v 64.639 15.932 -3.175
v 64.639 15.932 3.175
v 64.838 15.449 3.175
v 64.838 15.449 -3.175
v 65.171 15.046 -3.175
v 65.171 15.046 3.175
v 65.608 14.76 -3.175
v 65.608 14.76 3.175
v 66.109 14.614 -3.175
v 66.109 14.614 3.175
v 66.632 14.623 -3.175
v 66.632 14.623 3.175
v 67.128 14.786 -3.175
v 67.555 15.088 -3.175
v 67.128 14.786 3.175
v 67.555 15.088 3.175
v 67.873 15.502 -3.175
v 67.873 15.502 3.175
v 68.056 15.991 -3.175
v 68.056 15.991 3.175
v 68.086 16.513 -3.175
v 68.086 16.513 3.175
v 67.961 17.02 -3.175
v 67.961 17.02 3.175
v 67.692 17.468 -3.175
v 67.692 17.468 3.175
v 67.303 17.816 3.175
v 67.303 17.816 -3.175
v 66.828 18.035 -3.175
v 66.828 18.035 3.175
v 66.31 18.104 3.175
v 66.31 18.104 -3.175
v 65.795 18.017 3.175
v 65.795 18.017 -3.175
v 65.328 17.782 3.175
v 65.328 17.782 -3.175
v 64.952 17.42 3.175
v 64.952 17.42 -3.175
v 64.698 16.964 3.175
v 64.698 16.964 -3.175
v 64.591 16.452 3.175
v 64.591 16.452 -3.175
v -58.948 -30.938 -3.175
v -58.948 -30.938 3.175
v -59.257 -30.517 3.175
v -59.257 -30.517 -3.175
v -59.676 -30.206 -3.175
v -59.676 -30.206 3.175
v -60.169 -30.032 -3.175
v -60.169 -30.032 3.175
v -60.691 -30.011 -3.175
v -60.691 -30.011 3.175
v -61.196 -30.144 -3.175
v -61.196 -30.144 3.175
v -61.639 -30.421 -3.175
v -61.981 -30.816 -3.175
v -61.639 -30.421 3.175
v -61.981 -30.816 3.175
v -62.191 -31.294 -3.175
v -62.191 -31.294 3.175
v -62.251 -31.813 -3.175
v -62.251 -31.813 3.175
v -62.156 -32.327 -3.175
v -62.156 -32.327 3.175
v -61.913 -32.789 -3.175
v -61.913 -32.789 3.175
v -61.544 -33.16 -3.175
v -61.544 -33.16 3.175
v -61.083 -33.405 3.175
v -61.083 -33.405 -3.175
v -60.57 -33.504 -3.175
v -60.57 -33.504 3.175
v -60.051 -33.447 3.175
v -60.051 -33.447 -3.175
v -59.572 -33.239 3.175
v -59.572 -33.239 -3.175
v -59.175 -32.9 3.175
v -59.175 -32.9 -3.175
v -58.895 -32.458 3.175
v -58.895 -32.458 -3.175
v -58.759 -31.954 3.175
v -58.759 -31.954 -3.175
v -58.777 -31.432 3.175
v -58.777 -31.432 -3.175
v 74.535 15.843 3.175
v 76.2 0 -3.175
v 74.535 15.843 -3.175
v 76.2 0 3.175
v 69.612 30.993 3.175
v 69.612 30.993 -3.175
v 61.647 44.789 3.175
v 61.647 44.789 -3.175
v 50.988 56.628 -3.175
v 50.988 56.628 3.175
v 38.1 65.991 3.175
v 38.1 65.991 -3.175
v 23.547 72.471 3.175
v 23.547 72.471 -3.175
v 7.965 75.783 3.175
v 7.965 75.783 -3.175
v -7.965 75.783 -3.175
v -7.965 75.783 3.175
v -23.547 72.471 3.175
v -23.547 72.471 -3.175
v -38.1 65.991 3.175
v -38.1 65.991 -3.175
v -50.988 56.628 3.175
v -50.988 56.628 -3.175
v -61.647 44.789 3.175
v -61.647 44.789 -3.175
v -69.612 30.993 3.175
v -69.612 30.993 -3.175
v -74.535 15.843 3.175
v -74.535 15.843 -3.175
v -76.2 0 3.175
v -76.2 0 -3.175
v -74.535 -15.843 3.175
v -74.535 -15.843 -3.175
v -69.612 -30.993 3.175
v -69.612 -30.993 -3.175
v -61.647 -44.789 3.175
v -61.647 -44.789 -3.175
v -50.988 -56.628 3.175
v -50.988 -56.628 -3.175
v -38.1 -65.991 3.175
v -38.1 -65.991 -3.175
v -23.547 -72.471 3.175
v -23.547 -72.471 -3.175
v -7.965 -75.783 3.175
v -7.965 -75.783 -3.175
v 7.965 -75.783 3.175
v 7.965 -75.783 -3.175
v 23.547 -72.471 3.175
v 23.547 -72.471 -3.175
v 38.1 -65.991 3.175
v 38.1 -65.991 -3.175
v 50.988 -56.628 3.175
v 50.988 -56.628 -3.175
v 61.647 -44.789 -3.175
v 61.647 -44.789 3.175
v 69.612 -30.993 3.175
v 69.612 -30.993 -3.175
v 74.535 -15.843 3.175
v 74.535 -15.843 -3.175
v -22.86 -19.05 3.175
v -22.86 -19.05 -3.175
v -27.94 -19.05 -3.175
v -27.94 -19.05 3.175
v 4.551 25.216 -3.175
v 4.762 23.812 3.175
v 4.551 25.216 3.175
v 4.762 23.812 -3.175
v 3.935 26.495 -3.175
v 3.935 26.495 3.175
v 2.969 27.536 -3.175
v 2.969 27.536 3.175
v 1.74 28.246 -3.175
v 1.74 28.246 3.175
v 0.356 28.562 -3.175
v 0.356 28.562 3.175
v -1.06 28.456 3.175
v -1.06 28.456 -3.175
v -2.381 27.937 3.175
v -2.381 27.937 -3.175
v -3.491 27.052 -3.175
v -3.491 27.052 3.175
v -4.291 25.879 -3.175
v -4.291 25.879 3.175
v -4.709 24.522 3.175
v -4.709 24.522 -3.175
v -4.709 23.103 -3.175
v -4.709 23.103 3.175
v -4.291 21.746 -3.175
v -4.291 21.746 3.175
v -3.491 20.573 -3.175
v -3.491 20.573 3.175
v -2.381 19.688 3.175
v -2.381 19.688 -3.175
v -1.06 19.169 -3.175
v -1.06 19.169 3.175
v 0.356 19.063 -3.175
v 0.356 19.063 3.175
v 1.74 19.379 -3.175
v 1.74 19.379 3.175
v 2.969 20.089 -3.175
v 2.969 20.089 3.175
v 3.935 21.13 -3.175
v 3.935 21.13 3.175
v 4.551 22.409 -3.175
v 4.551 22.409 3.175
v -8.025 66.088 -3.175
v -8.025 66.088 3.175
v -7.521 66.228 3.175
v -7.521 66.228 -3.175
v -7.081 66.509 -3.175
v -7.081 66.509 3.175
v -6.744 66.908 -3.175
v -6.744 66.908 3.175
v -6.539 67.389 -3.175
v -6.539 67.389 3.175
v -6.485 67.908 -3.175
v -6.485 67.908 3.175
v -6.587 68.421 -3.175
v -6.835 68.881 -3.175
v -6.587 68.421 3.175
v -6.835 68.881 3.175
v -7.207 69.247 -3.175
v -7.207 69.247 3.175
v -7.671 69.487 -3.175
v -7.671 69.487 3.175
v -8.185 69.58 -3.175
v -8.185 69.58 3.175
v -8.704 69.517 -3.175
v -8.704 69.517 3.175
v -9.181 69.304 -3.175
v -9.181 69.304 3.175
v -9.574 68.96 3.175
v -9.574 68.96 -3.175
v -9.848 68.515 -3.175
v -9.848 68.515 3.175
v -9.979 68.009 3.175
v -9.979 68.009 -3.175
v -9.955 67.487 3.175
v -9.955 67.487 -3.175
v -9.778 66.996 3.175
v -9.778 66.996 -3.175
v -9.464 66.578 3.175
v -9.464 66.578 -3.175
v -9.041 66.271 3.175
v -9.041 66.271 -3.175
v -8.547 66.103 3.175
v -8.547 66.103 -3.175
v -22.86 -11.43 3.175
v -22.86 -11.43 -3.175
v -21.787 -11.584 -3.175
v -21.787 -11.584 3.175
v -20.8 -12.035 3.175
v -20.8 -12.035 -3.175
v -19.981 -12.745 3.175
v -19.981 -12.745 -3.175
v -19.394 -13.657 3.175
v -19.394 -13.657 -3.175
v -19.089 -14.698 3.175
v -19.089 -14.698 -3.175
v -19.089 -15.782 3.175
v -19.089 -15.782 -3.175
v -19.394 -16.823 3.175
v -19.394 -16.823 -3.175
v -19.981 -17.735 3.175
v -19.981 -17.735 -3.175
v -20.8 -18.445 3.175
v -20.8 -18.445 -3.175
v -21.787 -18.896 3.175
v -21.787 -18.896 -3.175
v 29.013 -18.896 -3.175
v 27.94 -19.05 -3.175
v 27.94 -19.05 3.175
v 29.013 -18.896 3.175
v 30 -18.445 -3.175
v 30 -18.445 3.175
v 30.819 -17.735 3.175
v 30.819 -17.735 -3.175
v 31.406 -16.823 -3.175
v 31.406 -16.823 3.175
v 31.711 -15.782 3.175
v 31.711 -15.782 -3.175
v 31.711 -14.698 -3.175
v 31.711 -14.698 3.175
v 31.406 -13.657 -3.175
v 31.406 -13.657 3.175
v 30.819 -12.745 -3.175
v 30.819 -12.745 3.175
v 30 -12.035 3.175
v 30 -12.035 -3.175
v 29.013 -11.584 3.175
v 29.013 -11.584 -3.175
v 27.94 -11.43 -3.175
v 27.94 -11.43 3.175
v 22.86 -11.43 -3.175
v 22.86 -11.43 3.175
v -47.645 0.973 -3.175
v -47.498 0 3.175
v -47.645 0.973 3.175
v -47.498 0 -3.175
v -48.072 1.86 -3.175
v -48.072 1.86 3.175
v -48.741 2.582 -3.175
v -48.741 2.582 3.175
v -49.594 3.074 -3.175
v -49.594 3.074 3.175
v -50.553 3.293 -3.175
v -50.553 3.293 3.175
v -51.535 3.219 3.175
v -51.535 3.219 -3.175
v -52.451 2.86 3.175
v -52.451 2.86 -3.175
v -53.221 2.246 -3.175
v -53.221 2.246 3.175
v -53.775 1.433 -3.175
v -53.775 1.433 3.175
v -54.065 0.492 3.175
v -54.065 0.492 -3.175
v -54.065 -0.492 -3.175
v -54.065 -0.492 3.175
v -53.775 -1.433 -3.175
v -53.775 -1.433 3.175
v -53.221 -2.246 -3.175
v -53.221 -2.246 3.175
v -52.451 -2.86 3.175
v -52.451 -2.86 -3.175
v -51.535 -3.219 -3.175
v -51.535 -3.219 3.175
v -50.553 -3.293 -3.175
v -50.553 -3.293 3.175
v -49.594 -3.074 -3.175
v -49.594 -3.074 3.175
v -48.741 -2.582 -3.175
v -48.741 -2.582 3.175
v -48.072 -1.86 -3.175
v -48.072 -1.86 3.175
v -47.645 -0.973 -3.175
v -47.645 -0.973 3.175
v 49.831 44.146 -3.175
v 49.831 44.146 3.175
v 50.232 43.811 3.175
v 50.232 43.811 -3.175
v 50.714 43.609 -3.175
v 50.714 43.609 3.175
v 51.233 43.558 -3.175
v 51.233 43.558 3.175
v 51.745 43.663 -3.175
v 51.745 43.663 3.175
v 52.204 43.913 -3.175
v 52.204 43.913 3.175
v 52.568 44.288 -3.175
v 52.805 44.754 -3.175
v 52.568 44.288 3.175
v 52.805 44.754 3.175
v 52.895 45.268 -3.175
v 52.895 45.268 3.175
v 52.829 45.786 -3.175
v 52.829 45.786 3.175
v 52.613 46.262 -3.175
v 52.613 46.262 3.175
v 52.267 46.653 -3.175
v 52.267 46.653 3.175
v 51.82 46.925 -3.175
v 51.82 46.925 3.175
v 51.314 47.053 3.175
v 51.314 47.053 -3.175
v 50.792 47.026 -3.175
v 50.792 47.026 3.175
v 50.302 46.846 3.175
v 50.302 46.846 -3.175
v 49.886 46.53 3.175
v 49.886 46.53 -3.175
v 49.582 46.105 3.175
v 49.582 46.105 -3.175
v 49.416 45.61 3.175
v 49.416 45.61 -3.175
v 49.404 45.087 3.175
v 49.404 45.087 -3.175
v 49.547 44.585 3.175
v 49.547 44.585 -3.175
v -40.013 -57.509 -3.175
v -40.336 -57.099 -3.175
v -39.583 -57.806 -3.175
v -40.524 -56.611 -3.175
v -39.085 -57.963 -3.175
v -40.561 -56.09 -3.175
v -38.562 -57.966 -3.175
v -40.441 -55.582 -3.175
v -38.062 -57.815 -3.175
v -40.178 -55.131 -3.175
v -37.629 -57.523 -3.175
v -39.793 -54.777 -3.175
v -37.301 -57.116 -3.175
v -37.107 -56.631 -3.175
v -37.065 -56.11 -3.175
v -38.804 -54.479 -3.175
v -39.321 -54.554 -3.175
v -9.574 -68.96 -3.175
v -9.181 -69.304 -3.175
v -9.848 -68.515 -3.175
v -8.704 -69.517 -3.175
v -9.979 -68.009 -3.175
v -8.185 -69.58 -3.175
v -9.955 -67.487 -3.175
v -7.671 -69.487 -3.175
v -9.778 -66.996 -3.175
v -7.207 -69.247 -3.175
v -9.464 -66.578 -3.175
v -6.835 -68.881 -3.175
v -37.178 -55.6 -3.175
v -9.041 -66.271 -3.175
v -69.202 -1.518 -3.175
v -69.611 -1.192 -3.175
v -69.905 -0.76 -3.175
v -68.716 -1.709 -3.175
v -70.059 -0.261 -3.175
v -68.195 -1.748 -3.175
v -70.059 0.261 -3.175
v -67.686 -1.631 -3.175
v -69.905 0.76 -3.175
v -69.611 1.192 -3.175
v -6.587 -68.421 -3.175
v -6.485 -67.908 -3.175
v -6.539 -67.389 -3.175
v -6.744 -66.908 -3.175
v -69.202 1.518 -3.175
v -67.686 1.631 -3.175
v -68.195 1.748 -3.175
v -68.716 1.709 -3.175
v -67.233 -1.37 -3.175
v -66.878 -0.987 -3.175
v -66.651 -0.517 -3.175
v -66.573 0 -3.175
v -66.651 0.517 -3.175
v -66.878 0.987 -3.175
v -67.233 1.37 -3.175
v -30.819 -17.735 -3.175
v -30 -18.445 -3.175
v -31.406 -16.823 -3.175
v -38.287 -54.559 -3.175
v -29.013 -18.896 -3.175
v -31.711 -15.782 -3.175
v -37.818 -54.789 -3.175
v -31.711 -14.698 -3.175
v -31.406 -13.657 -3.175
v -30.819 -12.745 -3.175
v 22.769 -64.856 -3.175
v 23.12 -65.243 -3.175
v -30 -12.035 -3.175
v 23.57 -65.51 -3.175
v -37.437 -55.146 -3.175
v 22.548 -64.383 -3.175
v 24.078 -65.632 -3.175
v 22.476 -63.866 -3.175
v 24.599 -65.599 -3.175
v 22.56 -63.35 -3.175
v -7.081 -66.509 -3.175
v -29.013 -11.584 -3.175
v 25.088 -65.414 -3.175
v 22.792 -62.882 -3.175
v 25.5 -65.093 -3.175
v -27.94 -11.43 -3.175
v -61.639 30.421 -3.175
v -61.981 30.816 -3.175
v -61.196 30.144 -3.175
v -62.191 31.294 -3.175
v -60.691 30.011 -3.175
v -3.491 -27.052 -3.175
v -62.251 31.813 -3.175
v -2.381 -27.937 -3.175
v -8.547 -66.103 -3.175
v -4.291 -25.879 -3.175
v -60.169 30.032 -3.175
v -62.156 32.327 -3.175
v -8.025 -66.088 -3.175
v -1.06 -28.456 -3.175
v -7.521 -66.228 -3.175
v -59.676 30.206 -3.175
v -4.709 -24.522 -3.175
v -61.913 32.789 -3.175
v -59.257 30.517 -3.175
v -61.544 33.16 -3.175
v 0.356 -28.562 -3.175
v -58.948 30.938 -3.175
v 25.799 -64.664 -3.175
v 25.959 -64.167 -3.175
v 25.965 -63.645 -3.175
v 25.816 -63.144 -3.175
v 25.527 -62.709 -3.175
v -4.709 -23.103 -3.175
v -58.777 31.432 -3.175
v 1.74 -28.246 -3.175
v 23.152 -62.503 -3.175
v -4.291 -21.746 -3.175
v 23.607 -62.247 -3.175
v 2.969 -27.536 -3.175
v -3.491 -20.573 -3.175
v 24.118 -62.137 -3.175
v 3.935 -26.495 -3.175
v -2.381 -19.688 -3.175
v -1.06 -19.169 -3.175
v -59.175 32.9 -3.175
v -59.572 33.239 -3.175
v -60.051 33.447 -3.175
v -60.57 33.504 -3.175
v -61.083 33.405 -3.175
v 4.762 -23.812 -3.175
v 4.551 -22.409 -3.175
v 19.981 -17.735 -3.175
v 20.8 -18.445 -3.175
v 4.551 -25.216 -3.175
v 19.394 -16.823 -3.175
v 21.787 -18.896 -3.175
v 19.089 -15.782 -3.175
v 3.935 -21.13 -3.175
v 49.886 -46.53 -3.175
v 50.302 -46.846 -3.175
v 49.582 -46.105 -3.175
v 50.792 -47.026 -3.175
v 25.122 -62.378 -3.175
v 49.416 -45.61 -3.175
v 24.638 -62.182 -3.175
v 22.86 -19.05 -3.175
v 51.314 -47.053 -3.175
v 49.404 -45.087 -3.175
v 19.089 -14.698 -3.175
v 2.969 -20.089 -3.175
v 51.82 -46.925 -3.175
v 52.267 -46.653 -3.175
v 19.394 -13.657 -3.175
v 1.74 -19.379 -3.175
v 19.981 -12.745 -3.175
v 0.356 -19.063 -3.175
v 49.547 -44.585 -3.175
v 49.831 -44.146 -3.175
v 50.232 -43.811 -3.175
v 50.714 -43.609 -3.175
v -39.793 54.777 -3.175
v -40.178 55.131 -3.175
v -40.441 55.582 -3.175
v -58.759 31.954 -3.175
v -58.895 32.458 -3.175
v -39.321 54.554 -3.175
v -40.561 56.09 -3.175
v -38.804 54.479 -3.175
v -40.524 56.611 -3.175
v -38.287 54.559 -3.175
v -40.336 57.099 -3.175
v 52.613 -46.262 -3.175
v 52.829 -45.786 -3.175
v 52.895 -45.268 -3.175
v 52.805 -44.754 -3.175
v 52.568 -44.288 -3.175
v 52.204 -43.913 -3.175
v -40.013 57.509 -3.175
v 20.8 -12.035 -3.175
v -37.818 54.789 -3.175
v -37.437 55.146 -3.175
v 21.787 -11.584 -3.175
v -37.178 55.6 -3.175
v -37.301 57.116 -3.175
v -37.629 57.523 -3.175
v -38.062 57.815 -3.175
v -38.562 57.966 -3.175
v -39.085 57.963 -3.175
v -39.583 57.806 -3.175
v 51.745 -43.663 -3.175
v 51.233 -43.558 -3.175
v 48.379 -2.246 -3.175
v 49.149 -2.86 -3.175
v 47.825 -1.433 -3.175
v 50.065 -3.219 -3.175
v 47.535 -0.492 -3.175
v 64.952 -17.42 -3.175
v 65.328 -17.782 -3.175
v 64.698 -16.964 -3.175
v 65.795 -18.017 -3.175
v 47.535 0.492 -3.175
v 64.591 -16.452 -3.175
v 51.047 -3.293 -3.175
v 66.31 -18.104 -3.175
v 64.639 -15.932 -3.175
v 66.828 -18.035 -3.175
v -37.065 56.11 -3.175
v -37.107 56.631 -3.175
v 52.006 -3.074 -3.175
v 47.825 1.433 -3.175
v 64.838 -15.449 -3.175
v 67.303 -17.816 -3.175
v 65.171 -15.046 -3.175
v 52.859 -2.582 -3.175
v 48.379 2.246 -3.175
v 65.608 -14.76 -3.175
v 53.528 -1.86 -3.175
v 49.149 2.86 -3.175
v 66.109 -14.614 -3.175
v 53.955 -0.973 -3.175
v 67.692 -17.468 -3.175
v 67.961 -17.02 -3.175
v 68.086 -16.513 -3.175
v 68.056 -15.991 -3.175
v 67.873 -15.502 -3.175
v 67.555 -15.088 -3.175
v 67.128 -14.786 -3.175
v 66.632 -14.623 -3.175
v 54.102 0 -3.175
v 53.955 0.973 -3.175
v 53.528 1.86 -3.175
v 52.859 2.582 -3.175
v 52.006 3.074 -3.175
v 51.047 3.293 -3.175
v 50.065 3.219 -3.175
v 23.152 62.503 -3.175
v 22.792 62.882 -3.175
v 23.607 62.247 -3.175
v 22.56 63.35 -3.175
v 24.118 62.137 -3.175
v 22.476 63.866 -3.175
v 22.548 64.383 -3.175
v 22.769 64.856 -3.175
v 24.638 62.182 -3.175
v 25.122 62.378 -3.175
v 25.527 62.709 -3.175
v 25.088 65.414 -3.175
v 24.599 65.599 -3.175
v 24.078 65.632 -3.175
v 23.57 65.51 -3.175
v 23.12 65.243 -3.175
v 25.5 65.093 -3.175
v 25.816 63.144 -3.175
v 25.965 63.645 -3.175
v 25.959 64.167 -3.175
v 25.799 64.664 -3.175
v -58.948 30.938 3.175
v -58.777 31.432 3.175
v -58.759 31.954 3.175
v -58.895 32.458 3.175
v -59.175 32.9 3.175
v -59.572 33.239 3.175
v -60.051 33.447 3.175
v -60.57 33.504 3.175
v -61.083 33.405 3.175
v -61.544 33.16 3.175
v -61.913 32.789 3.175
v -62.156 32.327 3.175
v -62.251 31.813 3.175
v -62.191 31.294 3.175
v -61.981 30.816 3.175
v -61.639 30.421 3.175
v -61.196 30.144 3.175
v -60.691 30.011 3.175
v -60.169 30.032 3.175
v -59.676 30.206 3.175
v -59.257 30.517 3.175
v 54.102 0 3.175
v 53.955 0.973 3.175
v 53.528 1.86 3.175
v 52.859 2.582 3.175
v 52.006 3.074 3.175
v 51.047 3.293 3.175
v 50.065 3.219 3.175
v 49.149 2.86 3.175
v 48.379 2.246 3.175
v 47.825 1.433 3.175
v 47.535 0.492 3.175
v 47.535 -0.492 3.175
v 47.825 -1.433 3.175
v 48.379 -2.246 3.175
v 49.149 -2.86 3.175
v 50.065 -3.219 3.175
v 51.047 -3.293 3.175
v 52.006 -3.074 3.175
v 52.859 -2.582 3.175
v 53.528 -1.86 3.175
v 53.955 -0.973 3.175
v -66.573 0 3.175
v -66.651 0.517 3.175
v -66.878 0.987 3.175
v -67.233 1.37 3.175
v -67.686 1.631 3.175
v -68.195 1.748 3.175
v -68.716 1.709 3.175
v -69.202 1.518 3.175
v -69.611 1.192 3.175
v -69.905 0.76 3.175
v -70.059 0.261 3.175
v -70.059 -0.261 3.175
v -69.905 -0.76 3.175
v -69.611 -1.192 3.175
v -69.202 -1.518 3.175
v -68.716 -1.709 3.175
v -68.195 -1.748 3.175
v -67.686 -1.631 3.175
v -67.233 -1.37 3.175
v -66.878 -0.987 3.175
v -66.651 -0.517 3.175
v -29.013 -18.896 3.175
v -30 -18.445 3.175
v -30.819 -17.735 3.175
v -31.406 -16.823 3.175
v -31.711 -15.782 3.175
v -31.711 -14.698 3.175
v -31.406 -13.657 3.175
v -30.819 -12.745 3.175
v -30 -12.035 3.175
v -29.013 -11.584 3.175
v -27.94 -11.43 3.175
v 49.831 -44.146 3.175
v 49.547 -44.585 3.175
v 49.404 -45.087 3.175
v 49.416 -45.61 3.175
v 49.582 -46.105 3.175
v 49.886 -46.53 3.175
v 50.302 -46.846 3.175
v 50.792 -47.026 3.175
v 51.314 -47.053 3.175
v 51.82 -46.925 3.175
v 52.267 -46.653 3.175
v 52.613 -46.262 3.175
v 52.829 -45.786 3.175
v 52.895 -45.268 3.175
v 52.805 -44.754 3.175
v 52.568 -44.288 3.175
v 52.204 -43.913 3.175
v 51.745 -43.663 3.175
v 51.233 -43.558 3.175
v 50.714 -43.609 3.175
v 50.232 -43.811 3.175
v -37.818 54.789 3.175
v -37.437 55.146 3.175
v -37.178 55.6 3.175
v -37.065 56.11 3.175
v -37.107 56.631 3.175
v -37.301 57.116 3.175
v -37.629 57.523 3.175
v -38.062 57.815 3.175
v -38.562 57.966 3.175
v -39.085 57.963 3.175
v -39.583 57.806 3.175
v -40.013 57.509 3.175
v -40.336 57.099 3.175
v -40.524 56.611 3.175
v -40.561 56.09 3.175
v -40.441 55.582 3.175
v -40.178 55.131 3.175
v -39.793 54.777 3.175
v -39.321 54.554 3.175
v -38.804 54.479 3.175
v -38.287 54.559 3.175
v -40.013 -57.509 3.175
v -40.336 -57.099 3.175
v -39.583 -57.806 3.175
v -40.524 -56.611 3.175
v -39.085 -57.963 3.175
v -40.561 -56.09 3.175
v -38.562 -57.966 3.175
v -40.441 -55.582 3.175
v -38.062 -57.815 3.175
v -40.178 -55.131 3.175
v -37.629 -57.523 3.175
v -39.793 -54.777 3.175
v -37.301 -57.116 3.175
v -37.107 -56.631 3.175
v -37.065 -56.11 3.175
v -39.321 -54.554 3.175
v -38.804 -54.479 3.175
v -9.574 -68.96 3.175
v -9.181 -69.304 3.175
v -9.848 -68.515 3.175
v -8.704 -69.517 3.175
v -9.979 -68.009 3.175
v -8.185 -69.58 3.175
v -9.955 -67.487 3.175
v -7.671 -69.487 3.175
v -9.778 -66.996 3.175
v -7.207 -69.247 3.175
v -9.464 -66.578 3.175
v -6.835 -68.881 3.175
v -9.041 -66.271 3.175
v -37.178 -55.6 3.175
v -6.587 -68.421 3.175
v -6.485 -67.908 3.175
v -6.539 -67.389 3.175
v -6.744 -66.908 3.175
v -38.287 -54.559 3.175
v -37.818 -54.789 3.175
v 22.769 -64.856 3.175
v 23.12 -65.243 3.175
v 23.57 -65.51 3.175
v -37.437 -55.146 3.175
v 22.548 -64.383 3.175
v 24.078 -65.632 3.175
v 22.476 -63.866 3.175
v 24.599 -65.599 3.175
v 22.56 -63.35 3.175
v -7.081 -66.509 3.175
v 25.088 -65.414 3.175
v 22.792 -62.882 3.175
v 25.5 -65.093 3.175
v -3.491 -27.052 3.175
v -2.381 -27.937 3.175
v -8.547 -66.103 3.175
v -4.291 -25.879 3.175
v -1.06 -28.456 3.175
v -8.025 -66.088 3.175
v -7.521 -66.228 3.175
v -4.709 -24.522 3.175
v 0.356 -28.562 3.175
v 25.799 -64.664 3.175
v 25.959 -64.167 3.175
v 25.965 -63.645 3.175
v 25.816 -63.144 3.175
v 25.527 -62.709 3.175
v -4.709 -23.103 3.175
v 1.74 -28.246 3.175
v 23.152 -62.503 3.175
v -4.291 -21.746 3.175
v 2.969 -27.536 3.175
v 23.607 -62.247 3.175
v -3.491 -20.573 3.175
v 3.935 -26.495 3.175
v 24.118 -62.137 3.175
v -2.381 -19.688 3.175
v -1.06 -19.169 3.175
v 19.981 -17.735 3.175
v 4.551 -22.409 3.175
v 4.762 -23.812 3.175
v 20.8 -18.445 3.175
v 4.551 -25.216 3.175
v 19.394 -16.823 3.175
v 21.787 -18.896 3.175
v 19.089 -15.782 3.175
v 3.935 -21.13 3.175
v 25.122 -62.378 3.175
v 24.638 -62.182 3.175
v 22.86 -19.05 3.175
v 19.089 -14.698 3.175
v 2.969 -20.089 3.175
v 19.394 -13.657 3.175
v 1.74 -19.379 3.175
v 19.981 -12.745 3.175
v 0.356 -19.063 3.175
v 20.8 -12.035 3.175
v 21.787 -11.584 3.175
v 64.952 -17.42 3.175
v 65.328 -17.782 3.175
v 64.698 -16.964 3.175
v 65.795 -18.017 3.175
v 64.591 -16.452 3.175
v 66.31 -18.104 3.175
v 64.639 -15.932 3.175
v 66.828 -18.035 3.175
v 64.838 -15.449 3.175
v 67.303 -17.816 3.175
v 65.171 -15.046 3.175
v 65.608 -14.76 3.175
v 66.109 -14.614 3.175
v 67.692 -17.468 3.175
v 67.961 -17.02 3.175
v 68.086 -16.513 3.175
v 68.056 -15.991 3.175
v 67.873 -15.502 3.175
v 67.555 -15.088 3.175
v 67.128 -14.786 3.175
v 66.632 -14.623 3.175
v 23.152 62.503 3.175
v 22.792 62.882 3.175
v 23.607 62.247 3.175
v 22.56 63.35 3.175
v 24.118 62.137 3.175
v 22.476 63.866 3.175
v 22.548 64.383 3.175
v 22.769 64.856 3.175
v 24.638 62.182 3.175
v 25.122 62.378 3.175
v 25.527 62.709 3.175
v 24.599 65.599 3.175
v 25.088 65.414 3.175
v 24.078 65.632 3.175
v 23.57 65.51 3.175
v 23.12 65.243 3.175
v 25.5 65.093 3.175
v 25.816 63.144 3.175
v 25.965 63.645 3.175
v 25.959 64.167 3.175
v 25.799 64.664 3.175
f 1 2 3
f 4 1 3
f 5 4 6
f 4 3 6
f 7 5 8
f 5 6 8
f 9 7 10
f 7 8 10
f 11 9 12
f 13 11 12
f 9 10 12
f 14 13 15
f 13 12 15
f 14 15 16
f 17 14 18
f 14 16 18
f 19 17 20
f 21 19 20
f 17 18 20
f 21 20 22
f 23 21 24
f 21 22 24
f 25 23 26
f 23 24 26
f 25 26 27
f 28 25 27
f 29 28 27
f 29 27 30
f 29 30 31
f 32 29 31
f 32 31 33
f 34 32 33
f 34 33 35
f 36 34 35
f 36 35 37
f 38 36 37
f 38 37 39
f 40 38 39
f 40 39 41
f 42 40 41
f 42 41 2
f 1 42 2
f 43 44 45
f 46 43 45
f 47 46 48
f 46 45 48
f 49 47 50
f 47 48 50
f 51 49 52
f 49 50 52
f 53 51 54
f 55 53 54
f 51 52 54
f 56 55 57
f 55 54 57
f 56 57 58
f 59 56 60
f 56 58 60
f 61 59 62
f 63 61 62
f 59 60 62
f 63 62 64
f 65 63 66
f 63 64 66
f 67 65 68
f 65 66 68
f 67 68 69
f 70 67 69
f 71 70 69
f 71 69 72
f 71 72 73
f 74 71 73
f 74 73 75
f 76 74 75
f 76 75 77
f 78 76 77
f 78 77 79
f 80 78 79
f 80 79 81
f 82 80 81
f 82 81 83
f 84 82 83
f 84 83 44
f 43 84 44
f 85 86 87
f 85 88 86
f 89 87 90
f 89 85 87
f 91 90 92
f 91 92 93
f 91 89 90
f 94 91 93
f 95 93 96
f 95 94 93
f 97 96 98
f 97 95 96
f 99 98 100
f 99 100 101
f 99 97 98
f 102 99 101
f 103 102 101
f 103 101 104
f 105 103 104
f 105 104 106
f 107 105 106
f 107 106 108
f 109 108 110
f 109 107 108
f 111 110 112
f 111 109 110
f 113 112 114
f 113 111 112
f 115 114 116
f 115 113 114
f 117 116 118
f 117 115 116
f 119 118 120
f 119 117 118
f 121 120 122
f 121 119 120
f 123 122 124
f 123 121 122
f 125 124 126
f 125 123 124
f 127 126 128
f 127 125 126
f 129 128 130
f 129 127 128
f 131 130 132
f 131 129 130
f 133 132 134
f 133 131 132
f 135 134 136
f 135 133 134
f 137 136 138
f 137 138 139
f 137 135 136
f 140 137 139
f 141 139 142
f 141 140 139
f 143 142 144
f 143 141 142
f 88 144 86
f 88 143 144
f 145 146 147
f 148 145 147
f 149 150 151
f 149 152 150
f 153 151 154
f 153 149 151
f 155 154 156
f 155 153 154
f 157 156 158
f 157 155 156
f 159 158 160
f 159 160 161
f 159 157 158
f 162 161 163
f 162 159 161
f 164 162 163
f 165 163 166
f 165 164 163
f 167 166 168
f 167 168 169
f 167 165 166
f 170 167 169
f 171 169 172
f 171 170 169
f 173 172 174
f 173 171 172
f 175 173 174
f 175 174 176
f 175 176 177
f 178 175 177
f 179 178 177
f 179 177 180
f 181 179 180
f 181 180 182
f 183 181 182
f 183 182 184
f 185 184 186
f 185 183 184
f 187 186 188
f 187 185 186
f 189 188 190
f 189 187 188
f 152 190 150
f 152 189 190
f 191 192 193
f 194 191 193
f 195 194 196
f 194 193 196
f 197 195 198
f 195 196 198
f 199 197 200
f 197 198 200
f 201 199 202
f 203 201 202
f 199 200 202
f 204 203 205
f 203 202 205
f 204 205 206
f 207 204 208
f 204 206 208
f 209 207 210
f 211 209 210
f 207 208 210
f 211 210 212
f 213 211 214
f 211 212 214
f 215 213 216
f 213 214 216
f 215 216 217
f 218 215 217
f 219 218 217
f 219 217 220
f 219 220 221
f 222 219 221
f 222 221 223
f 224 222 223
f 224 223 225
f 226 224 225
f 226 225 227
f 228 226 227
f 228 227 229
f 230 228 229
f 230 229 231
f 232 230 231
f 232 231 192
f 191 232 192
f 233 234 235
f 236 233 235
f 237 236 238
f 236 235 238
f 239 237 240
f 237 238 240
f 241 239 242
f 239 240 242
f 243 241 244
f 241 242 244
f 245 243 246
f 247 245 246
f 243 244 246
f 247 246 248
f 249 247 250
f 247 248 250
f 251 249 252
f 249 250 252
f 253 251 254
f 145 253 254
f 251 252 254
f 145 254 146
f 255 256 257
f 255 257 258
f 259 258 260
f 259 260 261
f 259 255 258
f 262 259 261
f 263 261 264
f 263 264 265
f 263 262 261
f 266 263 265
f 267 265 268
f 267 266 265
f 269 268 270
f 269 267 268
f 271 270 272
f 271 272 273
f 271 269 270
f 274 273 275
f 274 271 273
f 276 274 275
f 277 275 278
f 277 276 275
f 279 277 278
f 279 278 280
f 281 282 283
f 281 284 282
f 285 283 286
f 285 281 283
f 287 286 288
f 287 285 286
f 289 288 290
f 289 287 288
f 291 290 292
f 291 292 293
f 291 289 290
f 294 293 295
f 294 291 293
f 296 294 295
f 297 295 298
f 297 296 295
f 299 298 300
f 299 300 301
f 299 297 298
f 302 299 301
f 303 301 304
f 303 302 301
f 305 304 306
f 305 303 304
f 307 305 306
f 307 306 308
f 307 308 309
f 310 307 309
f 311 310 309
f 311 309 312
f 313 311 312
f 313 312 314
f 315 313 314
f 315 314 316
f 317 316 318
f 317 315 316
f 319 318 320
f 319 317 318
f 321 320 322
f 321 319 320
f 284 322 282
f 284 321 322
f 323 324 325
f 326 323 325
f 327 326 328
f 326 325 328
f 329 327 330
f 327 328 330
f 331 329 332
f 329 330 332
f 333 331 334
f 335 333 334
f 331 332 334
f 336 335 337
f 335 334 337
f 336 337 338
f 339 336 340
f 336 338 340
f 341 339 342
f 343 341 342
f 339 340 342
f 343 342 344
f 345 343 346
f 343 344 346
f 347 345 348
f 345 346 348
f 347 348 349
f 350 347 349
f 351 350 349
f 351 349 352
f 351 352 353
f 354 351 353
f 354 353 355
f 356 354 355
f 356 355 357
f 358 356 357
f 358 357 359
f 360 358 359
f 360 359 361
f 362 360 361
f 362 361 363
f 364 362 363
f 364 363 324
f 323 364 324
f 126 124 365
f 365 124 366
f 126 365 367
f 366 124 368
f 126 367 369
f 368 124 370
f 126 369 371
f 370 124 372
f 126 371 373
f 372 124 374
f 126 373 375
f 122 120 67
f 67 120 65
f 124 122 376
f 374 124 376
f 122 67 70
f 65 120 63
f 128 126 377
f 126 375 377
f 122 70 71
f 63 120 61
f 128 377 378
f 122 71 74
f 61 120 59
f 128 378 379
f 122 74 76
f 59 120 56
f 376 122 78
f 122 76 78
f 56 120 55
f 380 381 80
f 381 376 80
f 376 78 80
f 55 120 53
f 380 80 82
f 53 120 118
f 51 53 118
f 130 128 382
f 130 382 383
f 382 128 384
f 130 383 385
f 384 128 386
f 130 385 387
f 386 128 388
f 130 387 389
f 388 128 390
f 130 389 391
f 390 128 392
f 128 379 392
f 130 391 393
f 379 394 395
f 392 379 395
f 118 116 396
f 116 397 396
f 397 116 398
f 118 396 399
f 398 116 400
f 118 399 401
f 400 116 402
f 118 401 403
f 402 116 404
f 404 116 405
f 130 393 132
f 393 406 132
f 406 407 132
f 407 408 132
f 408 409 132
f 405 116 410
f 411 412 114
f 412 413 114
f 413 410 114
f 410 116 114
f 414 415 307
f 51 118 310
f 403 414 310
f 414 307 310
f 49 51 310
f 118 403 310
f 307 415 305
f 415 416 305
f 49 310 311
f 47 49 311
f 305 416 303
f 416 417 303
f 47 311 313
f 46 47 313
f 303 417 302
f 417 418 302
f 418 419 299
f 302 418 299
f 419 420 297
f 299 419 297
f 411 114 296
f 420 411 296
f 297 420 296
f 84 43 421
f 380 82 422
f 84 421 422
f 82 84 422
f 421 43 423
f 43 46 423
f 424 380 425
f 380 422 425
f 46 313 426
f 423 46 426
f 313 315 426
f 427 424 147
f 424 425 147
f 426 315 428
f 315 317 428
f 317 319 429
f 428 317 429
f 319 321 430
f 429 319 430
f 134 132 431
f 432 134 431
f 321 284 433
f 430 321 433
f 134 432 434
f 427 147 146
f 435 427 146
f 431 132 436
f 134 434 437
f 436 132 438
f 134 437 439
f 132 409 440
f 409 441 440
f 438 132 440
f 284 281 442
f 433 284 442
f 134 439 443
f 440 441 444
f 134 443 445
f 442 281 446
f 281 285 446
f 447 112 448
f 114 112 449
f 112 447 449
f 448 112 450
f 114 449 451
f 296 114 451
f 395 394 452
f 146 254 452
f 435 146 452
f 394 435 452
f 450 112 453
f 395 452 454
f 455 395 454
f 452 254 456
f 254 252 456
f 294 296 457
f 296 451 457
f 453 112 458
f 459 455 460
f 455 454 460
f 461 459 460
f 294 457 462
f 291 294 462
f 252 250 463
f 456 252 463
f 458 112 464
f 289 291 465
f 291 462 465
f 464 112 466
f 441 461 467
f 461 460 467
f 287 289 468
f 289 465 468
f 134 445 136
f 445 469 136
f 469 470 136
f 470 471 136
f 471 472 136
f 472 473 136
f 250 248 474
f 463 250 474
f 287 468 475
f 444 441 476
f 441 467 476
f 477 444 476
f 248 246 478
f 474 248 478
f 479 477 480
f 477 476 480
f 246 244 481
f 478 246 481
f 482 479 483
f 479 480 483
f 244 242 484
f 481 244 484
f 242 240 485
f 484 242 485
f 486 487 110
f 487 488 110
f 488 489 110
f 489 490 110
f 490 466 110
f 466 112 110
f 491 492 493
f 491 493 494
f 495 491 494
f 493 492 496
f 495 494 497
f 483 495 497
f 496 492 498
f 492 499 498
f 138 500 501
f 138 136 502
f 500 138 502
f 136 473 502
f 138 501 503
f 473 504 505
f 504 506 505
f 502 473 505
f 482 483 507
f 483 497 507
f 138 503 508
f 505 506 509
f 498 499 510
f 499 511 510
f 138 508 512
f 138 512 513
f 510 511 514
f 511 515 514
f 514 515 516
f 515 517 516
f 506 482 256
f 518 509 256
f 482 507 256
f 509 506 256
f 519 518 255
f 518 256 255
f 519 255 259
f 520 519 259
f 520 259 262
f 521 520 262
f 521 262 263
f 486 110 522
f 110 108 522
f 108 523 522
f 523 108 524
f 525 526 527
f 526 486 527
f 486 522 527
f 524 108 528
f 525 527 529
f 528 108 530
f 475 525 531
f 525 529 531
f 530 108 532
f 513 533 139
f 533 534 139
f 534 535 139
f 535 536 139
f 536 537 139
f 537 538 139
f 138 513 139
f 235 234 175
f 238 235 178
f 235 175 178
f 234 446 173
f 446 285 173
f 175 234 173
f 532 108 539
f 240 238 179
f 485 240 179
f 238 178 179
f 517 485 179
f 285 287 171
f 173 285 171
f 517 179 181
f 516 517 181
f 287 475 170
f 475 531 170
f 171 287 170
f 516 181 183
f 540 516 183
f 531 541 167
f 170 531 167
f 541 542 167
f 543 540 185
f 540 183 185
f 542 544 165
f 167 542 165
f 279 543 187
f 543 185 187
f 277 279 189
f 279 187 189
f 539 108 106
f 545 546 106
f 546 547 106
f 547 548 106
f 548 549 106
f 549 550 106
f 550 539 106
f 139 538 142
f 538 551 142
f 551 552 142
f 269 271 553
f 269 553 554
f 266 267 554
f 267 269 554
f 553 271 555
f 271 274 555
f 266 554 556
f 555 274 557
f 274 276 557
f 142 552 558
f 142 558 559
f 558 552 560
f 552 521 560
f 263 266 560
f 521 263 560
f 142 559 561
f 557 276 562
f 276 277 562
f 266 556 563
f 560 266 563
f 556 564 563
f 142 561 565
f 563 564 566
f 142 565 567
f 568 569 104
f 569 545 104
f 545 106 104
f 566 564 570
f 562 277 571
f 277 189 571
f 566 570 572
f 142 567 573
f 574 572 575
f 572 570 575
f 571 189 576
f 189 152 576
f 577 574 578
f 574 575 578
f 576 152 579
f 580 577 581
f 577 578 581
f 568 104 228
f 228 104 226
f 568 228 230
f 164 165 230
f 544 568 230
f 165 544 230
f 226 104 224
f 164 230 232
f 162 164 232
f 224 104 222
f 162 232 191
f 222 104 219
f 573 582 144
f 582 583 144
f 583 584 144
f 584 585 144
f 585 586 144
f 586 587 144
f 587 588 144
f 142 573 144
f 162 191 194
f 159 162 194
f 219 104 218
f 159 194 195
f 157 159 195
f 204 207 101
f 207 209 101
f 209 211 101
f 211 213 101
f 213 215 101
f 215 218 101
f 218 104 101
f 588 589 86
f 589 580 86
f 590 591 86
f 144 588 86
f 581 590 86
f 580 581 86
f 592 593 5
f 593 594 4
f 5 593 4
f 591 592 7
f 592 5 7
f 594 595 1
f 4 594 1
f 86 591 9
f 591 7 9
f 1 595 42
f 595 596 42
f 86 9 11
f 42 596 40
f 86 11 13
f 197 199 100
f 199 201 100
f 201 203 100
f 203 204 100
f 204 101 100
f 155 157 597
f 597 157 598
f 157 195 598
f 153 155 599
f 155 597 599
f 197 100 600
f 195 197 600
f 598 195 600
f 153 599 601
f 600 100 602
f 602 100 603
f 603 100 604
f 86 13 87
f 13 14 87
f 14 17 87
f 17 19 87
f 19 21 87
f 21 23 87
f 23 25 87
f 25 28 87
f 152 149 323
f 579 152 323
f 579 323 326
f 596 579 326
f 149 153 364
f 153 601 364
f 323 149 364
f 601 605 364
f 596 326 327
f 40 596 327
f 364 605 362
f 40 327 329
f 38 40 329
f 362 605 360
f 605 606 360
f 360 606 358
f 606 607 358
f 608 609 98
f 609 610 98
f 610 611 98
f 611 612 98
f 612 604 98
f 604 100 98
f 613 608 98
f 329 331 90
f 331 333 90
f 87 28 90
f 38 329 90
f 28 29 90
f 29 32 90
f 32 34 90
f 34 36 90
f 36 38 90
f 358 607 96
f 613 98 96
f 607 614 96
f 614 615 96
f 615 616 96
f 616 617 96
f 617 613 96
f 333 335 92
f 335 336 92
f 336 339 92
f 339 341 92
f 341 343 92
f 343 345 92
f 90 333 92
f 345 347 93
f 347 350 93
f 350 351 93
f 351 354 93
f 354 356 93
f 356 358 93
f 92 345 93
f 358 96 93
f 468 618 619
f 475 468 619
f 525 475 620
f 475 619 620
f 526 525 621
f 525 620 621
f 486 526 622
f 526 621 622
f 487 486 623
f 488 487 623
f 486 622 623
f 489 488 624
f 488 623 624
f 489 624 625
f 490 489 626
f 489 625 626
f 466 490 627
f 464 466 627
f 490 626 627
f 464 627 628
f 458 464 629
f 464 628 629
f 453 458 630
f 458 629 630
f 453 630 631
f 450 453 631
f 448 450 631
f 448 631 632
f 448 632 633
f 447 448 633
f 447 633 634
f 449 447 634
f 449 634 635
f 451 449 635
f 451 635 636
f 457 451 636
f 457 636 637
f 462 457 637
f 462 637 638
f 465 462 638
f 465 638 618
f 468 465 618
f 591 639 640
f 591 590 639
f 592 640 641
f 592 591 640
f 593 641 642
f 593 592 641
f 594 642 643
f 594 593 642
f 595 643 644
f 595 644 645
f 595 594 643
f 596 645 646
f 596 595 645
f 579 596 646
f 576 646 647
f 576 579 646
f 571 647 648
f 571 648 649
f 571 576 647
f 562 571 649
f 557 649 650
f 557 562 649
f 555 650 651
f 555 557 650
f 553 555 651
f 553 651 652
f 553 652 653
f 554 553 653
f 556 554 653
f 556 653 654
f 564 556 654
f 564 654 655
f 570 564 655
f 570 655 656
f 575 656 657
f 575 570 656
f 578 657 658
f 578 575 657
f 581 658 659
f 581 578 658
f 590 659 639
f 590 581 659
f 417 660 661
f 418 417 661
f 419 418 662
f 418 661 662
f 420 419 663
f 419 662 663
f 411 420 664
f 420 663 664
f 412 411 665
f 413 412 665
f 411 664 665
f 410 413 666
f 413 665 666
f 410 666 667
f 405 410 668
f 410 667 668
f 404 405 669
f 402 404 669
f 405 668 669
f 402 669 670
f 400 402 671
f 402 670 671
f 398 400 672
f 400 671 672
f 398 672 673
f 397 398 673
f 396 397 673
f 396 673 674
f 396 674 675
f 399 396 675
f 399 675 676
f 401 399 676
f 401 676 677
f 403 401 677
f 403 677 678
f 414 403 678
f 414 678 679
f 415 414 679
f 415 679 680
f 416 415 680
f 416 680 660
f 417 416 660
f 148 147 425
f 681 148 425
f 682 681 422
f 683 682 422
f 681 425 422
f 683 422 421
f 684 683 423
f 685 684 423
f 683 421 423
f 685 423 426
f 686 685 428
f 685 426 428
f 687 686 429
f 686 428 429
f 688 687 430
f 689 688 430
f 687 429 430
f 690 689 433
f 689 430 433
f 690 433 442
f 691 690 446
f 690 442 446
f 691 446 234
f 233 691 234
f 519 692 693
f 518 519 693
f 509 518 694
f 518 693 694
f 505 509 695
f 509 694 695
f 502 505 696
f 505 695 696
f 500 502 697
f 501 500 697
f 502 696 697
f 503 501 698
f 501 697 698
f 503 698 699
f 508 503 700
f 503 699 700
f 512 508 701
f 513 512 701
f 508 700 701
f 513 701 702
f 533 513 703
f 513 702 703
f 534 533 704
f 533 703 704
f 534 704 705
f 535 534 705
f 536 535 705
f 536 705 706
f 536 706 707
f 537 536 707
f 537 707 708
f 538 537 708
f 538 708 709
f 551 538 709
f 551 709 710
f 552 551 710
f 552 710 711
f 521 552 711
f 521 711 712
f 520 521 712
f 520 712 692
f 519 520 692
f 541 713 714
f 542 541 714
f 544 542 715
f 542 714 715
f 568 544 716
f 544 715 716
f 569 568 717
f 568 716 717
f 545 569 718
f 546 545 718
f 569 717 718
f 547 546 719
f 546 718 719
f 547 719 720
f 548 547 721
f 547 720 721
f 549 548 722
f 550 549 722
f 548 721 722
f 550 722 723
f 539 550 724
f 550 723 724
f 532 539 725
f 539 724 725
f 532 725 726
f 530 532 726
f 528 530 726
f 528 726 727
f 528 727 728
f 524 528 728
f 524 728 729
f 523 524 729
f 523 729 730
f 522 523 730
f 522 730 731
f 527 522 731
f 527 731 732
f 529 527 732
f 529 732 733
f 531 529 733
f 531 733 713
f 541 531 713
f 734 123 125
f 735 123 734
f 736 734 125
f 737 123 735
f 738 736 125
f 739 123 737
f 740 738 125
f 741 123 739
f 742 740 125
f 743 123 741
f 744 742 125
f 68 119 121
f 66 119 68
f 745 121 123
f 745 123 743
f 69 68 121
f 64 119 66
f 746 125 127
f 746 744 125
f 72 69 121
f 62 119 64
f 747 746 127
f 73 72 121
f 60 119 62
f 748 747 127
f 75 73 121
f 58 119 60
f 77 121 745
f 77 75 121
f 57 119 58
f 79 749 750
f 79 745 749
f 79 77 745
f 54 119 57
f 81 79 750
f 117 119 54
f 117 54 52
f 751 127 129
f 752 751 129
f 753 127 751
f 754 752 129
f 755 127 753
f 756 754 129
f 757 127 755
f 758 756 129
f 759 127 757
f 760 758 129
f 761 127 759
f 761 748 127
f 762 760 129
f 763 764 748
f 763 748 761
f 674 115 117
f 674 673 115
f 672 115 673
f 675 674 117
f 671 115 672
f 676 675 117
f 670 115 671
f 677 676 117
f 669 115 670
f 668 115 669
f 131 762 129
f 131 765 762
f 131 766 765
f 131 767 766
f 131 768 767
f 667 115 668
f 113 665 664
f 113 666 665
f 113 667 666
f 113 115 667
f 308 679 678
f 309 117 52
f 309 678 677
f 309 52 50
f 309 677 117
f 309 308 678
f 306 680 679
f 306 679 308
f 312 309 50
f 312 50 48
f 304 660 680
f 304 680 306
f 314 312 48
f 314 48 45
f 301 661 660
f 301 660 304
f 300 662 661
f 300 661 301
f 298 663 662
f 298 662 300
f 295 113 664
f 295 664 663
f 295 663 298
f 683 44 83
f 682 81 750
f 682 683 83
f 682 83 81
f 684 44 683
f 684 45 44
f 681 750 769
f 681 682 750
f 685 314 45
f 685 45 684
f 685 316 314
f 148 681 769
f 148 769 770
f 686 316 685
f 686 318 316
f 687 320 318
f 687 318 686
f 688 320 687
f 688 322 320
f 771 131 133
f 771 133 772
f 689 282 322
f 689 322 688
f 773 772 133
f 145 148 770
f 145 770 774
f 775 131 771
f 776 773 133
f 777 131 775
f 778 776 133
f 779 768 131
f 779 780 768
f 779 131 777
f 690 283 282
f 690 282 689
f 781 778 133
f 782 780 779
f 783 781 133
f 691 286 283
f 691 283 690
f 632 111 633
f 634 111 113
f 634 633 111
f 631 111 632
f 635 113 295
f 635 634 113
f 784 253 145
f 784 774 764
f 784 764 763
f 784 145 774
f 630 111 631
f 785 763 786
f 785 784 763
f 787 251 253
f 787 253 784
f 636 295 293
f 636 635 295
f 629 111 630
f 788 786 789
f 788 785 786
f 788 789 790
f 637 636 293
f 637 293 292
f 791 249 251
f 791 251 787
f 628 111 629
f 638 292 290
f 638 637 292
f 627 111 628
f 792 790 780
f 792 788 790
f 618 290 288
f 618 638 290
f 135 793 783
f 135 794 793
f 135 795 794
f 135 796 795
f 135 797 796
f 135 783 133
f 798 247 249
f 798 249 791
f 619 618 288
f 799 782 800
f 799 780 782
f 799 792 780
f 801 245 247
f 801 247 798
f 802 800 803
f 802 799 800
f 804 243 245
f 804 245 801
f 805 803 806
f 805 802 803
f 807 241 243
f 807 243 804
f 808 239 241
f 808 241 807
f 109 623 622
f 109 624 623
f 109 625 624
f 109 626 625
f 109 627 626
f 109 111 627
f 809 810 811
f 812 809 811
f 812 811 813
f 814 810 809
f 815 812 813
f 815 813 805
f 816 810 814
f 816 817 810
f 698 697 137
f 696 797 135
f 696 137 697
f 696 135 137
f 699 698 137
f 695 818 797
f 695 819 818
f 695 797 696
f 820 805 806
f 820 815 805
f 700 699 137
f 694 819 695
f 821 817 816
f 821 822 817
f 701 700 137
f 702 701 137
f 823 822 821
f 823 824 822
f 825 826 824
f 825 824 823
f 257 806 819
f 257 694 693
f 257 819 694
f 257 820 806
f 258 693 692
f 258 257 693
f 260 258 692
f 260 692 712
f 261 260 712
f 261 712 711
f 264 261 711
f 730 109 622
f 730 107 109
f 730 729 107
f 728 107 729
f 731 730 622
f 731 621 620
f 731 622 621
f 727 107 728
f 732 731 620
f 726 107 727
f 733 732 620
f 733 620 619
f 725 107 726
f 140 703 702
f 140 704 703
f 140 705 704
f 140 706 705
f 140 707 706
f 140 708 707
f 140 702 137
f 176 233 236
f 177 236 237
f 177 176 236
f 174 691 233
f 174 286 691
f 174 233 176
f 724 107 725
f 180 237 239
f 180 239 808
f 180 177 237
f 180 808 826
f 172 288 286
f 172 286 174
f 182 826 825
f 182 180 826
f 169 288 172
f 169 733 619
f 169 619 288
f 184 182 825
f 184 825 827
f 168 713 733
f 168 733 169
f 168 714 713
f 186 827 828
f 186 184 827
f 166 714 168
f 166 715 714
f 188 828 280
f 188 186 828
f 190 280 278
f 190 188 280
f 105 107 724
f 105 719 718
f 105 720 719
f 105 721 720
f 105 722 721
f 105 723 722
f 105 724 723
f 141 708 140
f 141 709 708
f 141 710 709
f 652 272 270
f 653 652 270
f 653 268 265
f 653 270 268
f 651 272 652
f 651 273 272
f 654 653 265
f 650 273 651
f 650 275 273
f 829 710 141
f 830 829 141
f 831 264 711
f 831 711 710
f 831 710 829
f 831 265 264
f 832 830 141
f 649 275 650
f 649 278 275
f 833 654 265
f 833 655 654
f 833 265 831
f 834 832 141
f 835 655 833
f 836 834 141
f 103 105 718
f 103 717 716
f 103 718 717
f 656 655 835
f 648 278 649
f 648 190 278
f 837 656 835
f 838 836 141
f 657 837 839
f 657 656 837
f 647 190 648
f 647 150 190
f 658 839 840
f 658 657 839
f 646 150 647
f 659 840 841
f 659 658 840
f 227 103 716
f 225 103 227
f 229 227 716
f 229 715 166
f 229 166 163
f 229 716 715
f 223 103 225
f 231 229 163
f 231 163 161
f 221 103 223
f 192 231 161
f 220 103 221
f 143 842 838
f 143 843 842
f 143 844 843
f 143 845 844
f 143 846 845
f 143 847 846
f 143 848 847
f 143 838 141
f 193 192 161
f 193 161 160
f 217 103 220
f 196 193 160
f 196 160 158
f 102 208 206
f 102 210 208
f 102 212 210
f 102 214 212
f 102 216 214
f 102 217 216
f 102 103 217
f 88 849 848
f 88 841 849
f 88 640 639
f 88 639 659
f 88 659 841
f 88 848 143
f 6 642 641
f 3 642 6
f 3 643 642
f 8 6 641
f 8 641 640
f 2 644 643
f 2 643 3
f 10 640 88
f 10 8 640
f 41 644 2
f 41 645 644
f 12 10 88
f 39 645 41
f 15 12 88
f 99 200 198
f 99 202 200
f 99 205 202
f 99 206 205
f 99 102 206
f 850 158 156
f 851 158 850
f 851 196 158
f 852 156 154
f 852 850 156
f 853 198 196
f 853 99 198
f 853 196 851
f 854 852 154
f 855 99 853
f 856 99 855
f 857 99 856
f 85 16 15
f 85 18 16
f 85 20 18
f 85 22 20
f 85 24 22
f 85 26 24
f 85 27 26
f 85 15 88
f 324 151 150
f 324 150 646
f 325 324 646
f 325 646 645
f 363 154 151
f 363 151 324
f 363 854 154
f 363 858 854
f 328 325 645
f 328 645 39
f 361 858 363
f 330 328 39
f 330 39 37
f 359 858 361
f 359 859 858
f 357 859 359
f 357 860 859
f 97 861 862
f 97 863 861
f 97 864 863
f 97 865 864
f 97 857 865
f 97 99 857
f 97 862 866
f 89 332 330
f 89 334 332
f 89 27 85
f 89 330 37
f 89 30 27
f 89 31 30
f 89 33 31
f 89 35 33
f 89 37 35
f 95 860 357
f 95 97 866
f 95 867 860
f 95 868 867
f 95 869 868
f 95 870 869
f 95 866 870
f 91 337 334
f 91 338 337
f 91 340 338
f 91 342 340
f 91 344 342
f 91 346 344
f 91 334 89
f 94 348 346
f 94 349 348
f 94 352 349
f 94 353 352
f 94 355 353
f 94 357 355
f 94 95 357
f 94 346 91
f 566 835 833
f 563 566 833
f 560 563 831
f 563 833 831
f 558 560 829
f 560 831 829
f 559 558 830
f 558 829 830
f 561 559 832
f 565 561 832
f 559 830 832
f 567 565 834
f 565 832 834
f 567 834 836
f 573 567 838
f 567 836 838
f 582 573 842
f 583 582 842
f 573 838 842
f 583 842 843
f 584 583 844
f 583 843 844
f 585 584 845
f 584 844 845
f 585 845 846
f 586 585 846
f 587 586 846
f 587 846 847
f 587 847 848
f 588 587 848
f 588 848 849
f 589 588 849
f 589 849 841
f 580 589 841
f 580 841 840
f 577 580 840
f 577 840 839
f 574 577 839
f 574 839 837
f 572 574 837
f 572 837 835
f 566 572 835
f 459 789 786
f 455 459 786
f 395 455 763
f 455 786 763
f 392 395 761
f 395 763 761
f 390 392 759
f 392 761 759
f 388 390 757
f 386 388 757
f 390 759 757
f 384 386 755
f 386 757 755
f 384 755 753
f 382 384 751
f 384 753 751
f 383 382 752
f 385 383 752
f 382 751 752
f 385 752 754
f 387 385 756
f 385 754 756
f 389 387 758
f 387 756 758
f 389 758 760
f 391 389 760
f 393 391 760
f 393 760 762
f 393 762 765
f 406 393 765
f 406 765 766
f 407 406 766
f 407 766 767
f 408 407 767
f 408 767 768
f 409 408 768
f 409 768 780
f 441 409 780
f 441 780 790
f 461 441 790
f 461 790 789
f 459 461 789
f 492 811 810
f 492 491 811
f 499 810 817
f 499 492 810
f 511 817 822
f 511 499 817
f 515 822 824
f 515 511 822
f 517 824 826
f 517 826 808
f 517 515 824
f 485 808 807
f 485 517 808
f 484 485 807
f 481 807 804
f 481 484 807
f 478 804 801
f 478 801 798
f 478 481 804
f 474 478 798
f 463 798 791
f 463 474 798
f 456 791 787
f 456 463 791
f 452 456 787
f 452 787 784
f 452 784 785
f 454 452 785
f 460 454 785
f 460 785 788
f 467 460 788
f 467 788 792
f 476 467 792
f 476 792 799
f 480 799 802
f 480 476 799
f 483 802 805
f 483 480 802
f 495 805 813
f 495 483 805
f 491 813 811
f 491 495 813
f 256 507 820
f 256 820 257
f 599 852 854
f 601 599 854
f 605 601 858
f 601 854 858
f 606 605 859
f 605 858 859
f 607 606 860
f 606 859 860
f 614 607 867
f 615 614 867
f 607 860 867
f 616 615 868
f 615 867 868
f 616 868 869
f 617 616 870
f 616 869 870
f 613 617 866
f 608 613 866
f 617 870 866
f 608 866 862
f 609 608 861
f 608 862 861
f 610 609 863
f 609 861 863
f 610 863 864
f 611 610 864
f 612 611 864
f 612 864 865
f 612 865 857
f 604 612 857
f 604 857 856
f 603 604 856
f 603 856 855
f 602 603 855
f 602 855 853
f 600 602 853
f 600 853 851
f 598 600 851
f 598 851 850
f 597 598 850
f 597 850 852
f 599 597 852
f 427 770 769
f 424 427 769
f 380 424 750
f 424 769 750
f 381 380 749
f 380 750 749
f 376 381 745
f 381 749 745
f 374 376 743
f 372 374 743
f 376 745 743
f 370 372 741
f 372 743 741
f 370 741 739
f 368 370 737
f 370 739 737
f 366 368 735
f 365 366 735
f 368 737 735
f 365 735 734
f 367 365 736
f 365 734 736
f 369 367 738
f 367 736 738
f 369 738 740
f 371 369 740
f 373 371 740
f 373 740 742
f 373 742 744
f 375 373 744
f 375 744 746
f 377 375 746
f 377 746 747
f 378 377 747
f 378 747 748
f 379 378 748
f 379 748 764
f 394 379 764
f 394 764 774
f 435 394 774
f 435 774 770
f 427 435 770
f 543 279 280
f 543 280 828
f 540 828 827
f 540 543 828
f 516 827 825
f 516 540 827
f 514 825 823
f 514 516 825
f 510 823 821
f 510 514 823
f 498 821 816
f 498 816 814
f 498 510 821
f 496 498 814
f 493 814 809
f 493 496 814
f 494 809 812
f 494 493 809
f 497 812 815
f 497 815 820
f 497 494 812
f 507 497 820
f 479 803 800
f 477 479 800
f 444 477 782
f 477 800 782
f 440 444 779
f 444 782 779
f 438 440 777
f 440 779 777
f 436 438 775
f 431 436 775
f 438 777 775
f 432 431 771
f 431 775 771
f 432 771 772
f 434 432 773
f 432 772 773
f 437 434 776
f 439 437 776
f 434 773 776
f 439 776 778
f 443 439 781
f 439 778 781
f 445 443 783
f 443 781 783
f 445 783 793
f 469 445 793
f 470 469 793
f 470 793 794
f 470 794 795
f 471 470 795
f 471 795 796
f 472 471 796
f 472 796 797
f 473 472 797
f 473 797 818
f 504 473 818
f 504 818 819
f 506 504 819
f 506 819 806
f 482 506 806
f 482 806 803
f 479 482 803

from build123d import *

# Parameters (mm, degrees)
SKETCH2_R           = 76.2
SKETCH2_R_2         = 3.302
SKETCH2_R_3         = 4.7625
BOSS_EXTRUDE1_DEPTH = 3.175
CUT_EXTRUDE1_DEPTH  = 6.35
SKETCH4_R           = 1.7526
CUT_EXTRUDE2_DEPTH  = 18.034
CIRPATTERN1_COUNT   = 13


with BuildPart() as part:
    # Sketch2 → Boss-Extrude1 (new, symmetric)
    with BuildSketch(Plane.XY):
        Circle(SKETCH2_R)
        with Locations((-50.8, 0)):
            Circle(SKETCH2_R_2, mode=Mode.SUBTRACT)
        with Locations((50.8, 0)):
            Circle(SKETCH2_R_2, mode=Mode.SUBTRACT)
        with Locations((0, 23.8125)):
            Circle(SKETCH2_R_3, mode=Mode.SUBTRACT)
        with Locations((0, -23.8125)):
            Circle(SKETCH2_R_3, mode=Mode.SUBTRACT)
    extrude(amount=BOSS_EXTRUDE1_DEPTH, both=True)

    # Sketch3 → Cut-Extrude1 (cut)
    with BuildSketch(Plane(origin=(0, 0, -3.175), x_dir=(-1, 0, 0), z_dir=(0, 0, -1))):
        with BuildLine():
            Line((-27.94, -11.43), (-22.86, -11.43))
            ThreePointArc((-22.86, -11.43), (-19.05, -15.24), (-22.86, -19.05))
            Line((-22.86, -19.05), (-27.94, -19.05))
            ThreePointArc((-27.94, -19.05), (-31.75, -15.24), (-27.94, -11.43))
        make_face()
    cut_extrude1 = extrude(amount=-CUT_EXTRUDE1_DEPTH, mode=Mode.SUBTRACT)

    # Mirror1: Cut-Extrude1 across plane
    add(cut_extrude1.mirror(Plane(origin=(0, 0, 0), x_dir=(0, 0, 1), z_dir=(1, 0, 0))), mode=Mode.SUBTRACT)

    # Sketch4 → Cut-Extrude2 (cut)
    with BuildSketch(Plane.XY.offset(3.175)):
        with Locations((-68.326, 0)):
            Circle(SKETCH4_R)
    cut_extrude2 = extrude(amount=-CUT_EXTRUDE2_DEPTH, mode=Mode.SUBTRACT)

    # CirPattern1: Cut-Extrude2 ×13 about axis
    cirpattern1_axis = Axis((0, 0, 0), (0, 0, 1))
    for i in range(1, CIRPATTERN1_COUNT):
        add(cut_extrude2.rotate(cirpattern1_axis, i * 360 / CIRPATTERN1_COUNT), mode=Mode.SUBTRACT)


solid = part.part
